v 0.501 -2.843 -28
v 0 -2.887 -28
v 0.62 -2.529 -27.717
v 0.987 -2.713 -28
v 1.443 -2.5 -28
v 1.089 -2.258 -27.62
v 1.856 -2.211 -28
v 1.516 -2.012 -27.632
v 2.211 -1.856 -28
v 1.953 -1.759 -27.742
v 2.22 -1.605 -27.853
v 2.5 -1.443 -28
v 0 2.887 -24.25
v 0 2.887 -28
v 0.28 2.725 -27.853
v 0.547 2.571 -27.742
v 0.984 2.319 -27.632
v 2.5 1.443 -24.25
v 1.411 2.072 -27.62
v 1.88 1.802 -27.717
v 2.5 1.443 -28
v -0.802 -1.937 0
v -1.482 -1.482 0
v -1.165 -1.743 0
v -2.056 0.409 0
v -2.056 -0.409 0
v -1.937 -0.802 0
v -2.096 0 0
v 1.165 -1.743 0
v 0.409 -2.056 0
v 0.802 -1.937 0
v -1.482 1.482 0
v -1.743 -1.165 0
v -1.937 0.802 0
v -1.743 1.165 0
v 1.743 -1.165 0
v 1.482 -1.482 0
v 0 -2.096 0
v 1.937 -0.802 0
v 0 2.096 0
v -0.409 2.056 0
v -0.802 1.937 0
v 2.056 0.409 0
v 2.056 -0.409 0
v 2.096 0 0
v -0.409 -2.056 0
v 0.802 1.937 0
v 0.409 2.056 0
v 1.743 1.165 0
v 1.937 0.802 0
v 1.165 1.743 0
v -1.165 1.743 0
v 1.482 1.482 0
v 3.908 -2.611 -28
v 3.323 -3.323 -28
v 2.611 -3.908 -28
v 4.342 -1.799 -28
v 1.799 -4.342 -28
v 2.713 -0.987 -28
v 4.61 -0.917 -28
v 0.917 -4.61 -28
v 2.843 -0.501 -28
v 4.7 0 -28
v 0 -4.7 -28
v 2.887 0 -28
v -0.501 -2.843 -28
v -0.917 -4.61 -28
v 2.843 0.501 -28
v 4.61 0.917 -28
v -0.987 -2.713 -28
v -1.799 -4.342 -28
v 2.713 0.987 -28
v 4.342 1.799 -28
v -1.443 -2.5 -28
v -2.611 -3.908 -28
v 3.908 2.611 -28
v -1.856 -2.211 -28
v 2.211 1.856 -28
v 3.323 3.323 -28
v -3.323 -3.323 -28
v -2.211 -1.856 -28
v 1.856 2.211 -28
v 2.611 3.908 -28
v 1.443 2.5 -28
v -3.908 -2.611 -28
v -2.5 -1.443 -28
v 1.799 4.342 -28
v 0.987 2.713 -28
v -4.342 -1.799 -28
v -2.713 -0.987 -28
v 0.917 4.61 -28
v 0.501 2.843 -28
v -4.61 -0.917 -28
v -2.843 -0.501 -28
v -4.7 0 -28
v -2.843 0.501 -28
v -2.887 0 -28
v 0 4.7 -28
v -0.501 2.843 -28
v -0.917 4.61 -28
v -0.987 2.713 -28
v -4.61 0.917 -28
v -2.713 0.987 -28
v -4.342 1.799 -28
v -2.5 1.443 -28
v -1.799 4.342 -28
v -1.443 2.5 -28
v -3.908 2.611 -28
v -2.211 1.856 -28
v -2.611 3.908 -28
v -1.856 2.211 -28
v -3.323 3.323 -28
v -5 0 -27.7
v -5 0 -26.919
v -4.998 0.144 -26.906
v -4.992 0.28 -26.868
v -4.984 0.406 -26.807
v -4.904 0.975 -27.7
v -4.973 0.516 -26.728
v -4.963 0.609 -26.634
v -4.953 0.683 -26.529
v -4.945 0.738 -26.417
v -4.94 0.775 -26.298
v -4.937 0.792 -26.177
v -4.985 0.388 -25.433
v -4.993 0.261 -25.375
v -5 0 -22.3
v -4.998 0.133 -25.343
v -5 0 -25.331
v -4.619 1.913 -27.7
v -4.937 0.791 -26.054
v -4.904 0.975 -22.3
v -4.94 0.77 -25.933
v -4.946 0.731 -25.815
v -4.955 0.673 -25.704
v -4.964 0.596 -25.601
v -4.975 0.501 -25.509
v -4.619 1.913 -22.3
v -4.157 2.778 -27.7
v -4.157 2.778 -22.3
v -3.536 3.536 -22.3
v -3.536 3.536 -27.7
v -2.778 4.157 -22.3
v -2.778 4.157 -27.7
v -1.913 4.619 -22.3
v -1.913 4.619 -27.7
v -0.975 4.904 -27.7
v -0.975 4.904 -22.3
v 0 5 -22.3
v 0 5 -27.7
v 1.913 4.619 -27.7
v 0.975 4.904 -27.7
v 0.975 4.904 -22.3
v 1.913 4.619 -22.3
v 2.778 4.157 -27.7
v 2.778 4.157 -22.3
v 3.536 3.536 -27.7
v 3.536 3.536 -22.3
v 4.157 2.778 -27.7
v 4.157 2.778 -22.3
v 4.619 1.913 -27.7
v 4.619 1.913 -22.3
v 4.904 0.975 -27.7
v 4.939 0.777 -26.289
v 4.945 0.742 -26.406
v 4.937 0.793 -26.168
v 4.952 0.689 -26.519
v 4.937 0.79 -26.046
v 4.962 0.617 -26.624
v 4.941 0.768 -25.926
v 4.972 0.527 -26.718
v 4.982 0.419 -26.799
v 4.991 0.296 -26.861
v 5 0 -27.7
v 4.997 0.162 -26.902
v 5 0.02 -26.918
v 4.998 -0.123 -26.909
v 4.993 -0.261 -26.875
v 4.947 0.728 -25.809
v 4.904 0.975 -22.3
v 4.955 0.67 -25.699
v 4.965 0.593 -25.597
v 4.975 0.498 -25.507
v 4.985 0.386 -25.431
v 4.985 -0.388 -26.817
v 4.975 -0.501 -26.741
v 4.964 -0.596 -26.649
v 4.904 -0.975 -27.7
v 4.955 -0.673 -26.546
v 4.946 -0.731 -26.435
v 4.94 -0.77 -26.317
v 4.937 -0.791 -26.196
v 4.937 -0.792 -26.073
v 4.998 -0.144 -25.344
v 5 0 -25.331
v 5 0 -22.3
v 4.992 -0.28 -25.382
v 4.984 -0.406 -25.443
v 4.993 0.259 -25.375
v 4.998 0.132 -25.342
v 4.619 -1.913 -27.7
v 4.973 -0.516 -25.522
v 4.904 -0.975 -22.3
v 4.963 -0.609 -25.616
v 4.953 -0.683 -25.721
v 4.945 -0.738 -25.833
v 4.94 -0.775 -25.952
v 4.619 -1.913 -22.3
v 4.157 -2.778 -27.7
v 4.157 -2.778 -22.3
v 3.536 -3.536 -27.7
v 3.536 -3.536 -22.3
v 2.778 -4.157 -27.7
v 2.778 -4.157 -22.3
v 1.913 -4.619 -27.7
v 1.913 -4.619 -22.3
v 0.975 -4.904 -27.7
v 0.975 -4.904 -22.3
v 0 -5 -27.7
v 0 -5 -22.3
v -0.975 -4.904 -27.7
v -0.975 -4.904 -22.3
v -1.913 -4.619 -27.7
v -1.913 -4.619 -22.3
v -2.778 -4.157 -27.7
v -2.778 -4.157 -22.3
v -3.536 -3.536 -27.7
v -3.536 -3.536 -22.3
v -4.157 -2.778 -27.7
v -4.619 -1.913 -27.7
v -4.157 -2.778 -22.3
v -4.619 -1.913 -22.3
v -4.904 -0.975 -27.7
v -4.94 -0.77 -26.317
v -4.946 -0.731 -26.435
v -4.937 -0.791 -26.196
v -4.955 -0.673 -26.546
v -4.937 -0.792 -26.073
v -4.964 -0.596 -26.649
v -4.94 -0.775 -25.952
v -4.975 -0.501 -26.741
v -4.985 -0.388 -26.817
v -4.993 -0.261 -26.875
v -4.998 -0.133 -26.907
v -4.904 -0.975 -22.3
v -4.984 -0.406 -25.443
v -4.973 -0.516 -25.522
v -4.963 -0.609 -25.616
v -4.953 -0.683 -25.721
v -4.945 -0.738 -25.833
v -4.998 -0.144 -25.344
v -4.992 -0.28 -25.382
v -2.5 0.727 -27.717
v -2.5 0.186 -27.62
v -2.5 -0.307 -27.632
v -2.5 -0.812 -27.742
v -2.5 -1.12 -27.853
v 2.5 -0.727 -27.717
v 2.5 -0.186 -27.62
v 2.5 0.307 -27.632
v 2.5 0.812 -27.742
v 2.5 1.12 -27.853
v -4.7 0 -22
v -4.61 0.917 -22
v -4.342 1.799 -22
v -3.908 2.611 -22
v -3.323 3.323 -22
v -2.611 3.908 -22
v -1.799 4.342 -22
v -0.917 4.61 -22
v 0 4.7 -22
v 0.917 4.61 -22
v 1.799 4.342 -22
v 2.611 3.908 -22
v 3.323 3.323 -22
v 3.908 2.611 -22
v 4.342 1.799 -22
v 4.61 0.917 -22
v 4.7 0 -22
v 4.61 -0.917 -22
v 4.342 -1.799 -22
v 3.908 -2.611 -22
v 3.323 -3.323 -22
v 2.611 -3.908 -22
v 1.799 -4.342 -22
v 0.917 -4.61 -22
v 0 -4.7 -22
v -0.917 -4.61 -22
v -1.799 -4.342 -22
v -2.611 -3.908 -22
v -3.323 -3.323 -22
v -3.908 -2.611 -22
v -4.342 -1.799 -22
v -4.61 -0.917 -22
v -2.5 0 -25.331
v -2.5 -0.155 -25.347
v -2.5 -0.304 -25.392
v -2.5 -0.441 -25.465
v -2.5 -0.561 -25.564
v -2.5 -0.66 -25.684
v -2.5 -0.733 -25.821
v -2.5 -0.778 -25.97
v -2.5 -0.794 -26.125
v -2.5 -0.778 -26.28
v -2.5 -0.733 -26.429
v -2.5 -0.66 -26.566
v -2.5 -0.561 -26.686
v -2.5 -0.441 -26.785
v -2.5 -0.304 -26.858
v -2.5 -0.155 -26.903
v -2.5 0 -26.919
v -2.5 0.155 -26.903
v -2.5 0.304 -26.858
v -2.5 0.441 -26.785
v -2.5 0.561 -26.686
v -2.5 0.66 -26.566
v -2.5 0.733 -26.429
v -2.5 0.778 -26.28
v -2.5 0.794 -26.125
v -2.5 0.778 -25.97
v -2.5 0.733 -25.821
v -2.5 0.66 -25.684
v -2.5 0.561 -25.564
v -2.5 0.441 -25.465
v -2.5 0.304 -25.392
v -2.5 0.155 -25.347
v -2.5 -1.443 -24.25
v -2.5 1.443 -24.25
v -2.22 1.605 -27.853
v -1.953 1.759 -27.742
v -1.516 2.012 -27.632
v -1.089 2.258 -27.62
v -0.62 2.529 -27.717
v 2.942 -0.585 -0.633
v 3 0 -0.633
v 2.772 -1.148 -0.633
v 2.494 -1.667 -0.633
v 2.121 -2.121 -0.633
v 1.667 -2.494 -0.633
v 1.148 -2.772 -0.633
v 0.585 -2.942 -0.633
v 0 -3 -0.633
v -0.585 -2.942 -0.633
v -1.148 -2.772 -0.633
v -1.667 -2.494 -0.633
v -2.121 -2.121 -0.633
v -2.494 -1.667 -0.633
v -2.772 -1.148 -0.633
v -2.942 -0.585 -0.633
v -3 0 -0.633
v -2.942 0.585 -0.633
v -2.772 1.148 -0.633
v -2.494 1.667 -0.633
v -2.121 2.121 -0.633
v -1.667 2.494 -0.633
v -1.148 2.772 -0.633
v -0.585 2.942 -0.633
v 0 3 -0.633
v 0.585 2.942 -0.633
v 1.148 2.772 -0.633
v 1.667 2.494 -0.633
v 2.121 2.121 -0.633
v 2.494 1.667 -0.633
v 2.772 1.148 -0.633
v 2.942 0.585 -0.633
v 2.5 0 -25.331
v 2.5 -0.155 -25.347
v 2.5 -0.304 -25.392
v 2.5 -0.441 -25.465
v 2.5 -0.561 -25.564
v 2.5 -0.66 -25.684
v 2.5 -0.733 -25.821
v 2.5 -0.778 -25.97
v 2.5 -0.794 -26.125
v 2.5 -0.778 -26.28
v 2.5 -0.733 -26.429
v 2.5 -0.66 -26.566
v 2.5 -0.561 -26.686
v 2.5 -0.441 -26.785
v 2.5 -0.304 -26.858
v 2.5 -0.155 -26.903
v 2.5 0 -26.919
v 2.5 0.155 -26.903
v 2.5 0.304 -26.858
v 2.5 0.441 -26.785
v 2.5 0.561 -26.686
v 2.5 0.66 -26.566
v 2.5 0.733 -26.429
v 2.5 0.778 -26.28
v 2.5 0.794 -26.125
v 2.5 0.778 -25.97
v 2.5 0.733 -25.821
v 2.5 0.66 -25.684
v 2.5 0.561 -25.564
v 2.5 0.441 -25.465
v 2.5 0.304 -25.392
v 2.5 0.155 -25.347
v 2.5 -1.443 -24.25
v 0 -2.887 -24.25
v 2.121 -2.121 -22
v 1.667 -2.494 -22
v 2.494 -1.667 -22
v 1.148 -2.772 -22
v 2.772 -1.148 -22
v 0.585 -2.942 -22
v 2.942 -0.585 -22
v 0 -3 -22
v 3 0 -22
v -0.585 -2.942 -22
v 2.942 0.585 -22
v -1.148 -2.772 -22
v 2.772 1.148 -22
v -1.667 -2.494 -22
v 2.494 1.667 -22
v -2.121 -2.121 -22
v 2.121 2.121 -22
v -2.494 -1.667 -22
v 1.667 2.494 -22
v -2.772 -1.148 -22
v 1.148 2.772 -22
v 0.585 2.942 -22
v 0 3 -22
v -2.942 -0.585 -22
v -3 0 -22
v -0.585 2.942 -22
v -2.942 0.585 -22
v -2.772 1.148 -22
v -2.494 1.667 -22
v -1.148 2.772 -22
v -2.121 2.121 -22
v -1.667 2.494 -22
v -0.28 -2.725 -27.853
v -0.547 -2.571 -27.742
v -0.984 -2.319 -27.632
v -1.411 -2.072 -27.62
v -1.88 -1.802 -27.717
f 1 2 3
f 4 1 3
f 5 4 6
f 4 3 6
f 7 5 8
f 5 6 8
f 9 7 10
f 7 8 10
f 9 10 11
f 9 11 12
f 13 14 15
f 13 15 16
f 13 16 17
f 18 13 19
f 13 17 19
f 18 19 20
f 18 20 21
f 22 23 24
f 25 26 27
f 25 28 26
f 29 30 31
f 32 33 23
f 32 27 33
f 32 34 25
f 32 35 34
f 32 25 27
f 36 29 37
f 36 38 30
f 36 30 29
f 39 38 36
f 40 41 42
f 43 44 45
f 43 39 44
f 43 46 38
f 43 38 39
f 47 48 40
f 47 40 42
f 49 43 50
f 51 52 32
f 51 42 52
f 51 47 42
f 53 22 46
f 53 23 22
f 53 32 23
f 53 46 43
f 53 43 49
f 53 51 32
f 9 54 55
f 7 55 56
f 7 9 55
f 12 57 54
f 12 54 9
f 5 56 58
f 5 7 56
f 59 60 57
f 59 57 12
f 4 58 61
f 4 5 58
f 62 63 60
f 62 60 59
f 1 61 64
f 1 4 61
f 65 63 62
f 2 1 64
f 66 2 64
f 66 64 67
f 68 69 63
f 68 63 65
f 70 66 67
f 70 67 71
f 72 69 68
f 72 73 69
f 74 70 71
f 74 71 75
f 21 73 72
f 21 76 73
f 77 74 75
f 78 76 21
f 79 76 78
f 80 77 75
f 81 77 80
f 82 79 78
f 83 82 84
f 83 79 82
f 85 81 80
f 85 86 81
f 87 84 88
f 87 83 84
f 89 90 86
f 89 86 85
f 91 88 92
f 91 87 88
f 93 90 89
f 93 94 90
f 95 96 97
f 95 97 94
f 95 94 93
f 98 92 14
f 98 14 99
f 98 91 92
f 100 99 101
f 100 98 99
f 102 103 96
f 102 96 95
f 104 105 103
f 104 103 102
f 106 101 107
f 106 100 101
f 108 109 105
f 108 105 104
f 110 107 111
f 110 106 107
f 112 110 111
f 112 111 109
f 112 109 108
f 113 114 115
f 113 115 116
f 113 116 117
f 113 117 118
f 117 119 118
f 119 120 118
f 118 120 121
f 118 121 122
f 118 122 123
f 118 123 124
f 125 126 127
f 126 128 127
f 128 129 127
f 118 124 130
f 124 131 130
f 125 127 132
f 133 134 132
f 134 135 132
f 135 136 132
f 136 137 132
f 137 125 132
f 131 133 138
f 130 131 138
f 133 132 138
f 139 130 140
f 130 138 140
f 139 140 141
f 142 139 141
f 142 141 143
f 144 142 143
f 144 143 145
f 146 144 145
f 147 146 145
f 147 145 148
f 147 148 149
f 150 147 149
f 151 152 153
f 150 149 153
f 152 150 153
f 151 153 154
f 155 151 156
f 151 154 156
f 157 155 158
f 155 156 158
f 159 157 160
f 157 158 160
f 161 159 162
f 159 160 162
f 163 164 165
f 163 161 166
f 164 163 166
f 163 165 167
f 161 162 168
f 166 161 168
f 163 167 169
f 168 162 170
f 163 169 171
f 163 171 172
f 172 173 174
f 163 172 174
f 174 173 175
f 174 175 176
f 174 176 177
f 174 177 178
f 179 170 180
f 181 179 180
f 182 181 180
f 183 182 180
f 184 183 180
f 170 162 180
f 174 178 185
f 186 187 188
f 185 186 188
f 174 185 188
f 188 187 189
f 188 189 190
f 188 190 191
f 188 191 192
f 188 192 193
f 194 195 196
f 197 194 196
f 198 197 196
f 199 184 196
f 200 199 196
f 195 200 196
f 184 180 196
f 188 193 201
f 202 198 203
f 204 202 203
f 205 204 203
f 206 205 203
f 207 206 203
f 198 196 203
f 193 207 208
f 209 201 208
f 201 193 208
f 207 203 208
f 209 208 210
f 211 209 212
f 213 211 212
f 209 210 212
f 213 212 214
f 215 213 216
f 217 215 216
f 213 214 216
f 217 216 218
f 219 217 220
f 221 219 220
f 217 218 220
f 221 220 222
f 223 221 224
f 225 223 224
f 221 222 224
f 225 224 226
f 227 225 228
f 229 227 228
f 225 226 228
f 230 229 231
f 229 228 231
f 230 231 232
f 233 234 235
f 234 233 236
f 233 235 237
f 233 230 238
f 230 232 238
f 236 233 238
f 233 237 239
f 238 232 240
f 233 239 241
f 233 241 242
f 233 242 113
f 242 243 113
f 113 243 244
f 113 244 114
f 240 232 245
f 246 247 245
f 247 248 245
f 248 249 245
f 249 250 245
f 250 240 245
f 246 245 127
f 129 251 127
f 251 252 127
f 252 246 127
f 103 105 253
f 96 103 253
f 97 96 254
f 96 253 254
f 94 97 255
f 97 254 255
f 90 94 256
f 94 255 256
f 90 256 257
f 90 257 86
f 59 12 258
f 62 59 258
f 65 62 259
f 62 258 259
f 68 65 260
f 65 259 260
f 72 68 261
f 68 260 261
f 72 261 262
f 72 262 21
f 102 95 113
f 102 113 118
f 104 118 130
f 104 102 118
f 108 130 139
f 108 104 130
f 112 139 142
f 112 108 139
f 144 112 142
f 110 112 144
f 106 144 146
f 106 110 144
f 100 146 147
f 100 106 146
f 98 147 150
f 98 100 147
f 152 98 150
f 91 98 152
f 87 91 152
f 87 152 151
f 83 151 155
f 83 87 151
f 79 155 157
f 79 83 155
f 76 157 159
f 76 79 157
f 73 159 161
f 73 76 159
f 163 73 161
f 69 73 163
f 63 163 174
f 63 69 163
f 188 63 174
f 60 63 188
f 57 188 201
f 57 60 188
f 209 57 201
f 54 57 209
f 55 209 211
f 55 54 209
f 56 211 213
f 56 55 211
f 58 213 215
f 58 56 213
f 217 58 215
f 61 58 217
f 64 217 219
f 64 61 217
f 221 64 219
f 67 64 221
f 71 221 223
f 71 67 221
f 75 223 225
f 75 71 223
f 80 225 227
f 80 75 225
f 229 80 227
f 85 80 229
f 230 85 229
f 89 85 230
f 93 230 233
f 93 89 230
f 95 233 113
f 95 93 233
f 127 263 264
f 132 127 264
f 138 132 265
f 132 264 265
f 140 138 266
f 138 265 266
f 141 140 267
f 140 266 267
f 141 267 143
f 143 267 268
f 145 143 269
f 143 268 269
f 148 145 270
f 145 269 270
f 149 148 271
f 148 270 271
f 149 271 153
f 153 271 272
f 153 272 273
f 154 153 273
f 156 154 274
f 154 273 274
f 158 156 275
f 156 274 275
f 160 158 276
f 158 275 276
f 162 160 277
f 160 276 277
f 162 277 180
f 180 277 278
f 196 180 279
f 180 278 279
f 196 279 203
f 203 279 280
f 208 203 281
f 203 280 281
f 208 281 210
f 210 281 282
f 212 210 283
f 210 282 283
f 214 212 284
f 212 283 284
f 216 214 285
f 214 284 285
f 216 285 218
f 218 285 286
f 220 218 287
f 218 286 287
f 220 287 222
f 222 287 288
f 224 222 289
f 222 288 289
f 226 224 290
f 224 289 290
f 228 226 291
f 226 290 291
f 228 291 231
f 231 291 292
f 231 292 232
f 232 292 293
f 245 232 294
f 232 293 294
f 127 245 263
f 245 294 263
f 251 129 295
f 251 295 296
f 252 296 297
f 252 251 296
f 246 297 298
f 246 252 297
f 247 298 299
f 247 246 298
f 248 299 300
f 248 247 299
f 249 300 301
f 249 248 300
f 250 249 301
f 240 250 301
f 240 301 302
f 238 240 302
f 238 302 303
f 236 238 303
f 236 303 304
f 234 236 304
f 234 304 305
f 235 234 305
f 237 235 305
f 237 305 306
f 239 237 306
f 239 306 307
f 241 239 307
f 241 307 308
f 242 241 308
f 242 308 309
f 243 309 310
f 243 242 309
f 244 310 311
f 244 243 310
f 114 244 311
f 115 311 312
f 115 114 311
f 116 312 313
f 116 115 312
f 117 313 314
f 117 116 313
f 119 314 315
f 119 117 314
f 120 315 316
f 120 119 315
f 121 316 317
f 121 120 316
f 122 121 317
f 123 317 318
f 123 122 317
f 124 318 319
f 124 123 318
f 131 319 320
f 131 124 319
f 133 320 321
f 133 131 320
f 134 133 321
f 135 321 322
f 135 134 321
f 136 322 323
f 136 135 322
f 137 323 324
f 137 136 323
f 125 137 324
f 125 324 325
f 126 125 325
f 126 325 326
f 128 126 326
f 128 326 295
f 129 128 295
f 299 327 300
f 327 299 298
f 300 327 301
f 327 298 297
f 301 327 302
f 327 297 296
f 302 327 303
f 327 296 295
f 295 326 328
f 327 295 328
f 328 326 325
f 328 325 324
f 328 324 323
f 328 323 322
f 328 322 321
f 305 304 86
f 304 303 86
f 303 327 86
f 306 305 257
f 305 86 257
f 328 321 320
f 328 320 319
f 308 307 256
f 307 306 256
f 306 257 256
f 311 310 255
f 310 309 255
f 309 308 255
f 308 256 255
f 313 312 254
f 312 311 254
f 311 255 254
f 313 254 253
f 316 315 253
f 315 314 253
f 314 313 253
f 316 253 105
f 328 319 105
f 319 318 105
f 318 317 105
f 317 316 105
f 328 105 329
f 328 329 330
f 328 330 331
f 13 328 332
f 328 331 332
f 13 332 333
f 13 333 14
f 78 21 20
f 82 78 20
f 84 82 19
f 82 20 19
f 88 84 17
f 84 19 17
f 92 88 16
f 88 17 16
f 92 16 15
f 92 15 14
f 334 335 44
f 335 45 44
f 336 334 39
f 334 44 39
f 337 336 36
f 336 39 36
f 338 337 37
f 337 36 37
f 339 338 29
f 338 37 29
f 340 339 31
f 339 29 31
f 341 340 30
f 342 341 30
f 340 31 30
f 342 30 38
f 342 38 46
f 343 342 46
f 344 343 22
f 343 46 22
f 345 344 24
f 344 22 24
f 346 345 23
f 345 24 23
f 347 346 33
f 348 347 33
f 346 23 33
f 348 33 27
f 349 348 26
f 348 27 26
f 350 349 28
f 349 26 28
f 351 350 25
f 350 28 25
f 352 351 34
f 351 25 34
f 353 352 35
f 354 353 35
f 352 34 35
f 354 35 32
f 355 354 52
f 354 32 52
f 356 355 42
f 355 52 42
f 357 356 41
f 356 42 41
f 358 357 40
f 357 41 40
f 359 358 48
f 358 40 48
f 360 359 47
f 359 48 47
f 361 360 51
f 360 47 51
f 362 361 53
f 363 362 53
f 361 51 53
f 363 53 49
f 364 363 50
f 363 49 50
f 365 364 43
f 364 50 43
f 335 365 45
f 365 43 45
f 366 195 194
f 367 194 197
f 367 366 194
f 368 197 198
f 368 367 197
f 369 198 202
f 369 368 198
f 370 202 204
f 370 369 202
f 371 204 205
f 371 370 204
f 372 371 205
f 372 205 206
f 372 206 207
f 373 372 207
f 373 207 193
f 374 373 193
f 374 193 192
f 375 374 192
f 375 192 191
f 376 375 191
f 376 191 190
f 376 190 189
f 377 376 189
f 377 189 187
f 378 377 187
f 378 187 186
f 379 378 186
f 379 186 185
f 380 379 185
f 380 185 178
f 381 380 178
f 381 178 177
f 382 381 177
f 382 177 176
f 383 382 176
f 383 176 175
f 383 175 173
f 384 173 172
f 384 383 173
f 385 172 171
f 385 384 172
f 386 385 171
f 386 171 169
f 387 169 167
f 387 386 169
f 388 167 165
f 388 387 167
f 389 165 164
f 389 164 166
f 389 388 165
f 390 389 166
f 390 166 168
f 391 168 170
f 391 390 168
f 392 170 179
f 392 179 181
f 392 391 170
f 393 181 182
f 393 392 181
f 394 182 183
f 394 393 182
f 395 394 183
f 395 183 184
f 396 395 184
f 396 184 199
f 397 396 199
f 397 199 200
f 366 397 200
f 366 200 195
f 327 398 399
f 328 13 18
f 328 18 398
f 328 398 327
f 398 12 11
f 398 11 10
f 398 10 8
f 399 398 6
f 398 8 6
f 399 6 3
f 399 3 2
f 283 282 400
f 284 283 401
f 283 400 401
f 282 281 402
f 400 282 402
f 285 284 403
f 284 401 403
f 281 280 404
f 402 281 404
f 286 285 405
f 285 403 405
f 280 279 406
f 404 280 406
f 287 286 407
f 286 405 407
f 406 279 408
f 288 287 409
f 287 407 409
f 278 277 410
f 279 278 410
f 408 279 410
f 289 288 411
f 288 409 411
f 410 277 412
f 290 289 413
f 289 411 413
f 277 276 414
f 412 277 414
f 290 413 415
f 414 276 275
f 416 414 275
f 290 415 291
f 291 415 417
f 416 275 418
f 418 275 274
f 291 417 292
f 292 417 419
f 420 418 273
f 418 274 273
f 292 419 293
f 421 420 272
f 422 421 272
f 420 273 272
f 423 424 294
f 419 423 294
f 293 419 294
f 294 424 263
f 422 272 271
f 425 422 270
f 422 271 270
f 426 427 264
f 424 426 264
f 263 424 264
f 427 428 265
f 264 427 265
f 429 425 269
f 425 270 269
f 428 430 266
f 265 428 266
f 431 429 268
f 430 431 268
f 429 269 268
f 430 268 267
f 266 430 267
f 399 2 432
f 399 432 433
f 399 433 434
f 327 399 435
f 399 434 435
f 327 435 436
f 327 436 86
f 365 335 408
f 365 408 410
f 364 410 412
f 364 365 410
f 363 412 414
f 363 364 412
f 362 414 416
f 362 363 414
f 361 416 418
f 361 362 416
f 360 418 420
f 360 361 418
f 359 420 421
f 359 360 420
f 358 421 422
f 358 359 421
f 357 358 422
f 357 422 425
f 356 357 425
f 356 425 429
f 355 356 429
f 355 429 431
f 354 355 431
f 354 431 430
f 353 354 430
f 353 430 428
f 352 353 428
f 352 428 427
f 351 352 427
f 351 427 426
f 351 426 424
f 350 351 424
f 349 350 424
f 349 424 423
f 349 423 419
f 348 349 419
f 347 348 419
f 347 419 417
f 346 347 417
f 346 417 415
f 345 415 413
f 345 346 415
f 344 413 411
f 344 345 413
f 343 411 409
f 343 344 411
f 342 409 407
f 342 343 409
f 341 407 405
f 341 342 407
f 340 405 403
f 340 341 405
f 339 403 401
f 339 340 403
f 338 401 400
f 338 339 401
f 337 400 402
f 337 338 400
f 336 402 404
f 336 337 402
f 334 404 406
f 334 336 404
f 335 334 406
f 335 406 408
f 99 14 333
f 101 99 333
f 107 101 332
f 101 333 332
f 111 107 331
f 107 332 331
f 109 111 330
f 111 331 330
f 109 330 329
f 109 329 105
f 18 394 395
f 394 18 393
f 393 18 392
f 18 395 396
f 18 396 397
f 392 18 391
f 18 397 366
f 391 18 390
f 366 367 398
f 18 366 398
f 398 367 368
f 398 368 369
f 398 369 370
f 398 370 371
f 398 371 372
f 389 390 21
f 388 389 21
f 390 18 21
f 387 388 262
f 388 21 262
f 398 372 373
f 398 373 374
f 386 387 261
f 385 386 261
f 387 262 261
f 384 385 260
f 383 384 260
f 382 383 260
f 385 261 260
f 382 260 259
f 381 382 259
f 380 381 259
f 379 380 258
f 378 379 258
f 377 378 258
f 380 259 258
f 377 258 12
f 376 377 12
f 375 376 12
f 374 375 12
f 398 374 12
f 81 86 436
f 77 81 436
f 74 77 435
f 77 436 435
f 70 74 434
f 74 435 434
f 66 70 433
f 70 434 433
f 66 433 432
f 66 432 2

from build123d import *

# Parameters (mm, degrees)
SKETCH1_R               = 3
EXTRUDE1_DEPTH          = 22
SKETCH6_R               = 5
EXTRUDE2_DEPTH          = 6
CUT_EXTRUDE1_DEPTH      = 3.75
CHAMFER1_SIZE           = 0.3
CUT_EXTRUDE4_DEPTH      = 29.879058156
CUT_EXTRUDE4_DEPTH_BACK = 29.879058156
SKETCH13_R              = 0.79375


with BuildPart() as part:
    # Sketch1 → Extrude1 (new body)
    with BuildSketch(Plane.XY):
        Circle(SKETCH1_R)
    extrude(amount=-EXTRUDE1_DEPTH)

    # Sketch4 → Cut-Revolve1 (revolve, cut)
    with BuildSketch(Plane(origin=(0, 0, 0), x_dir=(0, 0, -1), z_dir=(1, 0, 0))):
        Polygon((0.632650852, 3), (0, 2.096480947), (0, 3), align=None)
    revolve(axis=Axis((0, 0, 0), (0, 0, -1)), mode=Mode.SUBTRACT)

    # Sketch6 → Extrude2 (add)
    with BuildSketch(Plane(origin=(0, 0, -22), x_dir=(-1, 0, 0), z_dir=(0, 0, -1))):
        Circle(SKETCH6_R)
    extrude(amount=EXTRUDE2_DEPTH)

    # Sketch7 → Cut-Extrude1 (cut)
    with BuildSketch(Plane(origin=(0, 0, -28), x_dir=(-1, 0, 0), z_dir=(0, 0, -1))):
        Polygon((0, 2.886751346), (-2.5, 1.443375673), (-2.5, -1.443375673), (0, -2.886751346), (2.5, -1.443375673), (2.5, 1.443375673), align=None)
    extrude(amount=-CUT_EXTRUDE1_DEPTH, mode=Mode.SUBTRACT)

    # Cut-Extrude2 cone 1 section (through the dimple's axis) → Cut-Extrude2 (revolve, cut)
    with BuildSketch(Plane(origin=(0, 0, -28), x_dir=(0, 1, 0), z_dir=(1, 0, 0))):
        Polygon((0, 0), (2.886751346, 0), (0, 2.886751346), align=None)
    revolve(axis=Axis((0, 0, -28), (0, 0, 1)), mode=Mode.SUBTRACT)

    # Chamfer1
    chamfer1_edges = [part.edges().sort_by_distance(p)[0] for p in [
        (5, 0, -28),
        (5, 0, -22),
    ]]
    chamfer(chamfer1_edges, length=CHAMFER1_SIZE)

    # Sketch10 → Revolve1 (revolve)
    with BuildSketch(Plane(origin=(0, 0, 0), x_dir=(0, 0, -1), z_dir=(1, 0, 0))):
        Polygon((22, 3), (22, 0), (20.507359313, 0), (21.75, 3), align=None)
    revolve(axis=Axis((0, 0, -22), (0, 0, 1)))

    # Sketch13 → Cut-Extrude4 (cut, two sides: drawn at the far end of the back side and taken through both)
    with BuildSketch(Plane(origin=(0, 0, 0), x_dir=(0, 0, -1), z_dir=(1, 0, 0)).offset(-CUT_EXTRUDE4_DEPTH_BACK)):
        with Locations((26.125, 0)):
            Circle(SKETCH13_R)
    extrude(amount=CUT_EXTRUDE4_DEPTH + CUT_EXTRUDE4_DEPTH_BACK, mode=Mode.SUBTRACT)


solid = part.part
